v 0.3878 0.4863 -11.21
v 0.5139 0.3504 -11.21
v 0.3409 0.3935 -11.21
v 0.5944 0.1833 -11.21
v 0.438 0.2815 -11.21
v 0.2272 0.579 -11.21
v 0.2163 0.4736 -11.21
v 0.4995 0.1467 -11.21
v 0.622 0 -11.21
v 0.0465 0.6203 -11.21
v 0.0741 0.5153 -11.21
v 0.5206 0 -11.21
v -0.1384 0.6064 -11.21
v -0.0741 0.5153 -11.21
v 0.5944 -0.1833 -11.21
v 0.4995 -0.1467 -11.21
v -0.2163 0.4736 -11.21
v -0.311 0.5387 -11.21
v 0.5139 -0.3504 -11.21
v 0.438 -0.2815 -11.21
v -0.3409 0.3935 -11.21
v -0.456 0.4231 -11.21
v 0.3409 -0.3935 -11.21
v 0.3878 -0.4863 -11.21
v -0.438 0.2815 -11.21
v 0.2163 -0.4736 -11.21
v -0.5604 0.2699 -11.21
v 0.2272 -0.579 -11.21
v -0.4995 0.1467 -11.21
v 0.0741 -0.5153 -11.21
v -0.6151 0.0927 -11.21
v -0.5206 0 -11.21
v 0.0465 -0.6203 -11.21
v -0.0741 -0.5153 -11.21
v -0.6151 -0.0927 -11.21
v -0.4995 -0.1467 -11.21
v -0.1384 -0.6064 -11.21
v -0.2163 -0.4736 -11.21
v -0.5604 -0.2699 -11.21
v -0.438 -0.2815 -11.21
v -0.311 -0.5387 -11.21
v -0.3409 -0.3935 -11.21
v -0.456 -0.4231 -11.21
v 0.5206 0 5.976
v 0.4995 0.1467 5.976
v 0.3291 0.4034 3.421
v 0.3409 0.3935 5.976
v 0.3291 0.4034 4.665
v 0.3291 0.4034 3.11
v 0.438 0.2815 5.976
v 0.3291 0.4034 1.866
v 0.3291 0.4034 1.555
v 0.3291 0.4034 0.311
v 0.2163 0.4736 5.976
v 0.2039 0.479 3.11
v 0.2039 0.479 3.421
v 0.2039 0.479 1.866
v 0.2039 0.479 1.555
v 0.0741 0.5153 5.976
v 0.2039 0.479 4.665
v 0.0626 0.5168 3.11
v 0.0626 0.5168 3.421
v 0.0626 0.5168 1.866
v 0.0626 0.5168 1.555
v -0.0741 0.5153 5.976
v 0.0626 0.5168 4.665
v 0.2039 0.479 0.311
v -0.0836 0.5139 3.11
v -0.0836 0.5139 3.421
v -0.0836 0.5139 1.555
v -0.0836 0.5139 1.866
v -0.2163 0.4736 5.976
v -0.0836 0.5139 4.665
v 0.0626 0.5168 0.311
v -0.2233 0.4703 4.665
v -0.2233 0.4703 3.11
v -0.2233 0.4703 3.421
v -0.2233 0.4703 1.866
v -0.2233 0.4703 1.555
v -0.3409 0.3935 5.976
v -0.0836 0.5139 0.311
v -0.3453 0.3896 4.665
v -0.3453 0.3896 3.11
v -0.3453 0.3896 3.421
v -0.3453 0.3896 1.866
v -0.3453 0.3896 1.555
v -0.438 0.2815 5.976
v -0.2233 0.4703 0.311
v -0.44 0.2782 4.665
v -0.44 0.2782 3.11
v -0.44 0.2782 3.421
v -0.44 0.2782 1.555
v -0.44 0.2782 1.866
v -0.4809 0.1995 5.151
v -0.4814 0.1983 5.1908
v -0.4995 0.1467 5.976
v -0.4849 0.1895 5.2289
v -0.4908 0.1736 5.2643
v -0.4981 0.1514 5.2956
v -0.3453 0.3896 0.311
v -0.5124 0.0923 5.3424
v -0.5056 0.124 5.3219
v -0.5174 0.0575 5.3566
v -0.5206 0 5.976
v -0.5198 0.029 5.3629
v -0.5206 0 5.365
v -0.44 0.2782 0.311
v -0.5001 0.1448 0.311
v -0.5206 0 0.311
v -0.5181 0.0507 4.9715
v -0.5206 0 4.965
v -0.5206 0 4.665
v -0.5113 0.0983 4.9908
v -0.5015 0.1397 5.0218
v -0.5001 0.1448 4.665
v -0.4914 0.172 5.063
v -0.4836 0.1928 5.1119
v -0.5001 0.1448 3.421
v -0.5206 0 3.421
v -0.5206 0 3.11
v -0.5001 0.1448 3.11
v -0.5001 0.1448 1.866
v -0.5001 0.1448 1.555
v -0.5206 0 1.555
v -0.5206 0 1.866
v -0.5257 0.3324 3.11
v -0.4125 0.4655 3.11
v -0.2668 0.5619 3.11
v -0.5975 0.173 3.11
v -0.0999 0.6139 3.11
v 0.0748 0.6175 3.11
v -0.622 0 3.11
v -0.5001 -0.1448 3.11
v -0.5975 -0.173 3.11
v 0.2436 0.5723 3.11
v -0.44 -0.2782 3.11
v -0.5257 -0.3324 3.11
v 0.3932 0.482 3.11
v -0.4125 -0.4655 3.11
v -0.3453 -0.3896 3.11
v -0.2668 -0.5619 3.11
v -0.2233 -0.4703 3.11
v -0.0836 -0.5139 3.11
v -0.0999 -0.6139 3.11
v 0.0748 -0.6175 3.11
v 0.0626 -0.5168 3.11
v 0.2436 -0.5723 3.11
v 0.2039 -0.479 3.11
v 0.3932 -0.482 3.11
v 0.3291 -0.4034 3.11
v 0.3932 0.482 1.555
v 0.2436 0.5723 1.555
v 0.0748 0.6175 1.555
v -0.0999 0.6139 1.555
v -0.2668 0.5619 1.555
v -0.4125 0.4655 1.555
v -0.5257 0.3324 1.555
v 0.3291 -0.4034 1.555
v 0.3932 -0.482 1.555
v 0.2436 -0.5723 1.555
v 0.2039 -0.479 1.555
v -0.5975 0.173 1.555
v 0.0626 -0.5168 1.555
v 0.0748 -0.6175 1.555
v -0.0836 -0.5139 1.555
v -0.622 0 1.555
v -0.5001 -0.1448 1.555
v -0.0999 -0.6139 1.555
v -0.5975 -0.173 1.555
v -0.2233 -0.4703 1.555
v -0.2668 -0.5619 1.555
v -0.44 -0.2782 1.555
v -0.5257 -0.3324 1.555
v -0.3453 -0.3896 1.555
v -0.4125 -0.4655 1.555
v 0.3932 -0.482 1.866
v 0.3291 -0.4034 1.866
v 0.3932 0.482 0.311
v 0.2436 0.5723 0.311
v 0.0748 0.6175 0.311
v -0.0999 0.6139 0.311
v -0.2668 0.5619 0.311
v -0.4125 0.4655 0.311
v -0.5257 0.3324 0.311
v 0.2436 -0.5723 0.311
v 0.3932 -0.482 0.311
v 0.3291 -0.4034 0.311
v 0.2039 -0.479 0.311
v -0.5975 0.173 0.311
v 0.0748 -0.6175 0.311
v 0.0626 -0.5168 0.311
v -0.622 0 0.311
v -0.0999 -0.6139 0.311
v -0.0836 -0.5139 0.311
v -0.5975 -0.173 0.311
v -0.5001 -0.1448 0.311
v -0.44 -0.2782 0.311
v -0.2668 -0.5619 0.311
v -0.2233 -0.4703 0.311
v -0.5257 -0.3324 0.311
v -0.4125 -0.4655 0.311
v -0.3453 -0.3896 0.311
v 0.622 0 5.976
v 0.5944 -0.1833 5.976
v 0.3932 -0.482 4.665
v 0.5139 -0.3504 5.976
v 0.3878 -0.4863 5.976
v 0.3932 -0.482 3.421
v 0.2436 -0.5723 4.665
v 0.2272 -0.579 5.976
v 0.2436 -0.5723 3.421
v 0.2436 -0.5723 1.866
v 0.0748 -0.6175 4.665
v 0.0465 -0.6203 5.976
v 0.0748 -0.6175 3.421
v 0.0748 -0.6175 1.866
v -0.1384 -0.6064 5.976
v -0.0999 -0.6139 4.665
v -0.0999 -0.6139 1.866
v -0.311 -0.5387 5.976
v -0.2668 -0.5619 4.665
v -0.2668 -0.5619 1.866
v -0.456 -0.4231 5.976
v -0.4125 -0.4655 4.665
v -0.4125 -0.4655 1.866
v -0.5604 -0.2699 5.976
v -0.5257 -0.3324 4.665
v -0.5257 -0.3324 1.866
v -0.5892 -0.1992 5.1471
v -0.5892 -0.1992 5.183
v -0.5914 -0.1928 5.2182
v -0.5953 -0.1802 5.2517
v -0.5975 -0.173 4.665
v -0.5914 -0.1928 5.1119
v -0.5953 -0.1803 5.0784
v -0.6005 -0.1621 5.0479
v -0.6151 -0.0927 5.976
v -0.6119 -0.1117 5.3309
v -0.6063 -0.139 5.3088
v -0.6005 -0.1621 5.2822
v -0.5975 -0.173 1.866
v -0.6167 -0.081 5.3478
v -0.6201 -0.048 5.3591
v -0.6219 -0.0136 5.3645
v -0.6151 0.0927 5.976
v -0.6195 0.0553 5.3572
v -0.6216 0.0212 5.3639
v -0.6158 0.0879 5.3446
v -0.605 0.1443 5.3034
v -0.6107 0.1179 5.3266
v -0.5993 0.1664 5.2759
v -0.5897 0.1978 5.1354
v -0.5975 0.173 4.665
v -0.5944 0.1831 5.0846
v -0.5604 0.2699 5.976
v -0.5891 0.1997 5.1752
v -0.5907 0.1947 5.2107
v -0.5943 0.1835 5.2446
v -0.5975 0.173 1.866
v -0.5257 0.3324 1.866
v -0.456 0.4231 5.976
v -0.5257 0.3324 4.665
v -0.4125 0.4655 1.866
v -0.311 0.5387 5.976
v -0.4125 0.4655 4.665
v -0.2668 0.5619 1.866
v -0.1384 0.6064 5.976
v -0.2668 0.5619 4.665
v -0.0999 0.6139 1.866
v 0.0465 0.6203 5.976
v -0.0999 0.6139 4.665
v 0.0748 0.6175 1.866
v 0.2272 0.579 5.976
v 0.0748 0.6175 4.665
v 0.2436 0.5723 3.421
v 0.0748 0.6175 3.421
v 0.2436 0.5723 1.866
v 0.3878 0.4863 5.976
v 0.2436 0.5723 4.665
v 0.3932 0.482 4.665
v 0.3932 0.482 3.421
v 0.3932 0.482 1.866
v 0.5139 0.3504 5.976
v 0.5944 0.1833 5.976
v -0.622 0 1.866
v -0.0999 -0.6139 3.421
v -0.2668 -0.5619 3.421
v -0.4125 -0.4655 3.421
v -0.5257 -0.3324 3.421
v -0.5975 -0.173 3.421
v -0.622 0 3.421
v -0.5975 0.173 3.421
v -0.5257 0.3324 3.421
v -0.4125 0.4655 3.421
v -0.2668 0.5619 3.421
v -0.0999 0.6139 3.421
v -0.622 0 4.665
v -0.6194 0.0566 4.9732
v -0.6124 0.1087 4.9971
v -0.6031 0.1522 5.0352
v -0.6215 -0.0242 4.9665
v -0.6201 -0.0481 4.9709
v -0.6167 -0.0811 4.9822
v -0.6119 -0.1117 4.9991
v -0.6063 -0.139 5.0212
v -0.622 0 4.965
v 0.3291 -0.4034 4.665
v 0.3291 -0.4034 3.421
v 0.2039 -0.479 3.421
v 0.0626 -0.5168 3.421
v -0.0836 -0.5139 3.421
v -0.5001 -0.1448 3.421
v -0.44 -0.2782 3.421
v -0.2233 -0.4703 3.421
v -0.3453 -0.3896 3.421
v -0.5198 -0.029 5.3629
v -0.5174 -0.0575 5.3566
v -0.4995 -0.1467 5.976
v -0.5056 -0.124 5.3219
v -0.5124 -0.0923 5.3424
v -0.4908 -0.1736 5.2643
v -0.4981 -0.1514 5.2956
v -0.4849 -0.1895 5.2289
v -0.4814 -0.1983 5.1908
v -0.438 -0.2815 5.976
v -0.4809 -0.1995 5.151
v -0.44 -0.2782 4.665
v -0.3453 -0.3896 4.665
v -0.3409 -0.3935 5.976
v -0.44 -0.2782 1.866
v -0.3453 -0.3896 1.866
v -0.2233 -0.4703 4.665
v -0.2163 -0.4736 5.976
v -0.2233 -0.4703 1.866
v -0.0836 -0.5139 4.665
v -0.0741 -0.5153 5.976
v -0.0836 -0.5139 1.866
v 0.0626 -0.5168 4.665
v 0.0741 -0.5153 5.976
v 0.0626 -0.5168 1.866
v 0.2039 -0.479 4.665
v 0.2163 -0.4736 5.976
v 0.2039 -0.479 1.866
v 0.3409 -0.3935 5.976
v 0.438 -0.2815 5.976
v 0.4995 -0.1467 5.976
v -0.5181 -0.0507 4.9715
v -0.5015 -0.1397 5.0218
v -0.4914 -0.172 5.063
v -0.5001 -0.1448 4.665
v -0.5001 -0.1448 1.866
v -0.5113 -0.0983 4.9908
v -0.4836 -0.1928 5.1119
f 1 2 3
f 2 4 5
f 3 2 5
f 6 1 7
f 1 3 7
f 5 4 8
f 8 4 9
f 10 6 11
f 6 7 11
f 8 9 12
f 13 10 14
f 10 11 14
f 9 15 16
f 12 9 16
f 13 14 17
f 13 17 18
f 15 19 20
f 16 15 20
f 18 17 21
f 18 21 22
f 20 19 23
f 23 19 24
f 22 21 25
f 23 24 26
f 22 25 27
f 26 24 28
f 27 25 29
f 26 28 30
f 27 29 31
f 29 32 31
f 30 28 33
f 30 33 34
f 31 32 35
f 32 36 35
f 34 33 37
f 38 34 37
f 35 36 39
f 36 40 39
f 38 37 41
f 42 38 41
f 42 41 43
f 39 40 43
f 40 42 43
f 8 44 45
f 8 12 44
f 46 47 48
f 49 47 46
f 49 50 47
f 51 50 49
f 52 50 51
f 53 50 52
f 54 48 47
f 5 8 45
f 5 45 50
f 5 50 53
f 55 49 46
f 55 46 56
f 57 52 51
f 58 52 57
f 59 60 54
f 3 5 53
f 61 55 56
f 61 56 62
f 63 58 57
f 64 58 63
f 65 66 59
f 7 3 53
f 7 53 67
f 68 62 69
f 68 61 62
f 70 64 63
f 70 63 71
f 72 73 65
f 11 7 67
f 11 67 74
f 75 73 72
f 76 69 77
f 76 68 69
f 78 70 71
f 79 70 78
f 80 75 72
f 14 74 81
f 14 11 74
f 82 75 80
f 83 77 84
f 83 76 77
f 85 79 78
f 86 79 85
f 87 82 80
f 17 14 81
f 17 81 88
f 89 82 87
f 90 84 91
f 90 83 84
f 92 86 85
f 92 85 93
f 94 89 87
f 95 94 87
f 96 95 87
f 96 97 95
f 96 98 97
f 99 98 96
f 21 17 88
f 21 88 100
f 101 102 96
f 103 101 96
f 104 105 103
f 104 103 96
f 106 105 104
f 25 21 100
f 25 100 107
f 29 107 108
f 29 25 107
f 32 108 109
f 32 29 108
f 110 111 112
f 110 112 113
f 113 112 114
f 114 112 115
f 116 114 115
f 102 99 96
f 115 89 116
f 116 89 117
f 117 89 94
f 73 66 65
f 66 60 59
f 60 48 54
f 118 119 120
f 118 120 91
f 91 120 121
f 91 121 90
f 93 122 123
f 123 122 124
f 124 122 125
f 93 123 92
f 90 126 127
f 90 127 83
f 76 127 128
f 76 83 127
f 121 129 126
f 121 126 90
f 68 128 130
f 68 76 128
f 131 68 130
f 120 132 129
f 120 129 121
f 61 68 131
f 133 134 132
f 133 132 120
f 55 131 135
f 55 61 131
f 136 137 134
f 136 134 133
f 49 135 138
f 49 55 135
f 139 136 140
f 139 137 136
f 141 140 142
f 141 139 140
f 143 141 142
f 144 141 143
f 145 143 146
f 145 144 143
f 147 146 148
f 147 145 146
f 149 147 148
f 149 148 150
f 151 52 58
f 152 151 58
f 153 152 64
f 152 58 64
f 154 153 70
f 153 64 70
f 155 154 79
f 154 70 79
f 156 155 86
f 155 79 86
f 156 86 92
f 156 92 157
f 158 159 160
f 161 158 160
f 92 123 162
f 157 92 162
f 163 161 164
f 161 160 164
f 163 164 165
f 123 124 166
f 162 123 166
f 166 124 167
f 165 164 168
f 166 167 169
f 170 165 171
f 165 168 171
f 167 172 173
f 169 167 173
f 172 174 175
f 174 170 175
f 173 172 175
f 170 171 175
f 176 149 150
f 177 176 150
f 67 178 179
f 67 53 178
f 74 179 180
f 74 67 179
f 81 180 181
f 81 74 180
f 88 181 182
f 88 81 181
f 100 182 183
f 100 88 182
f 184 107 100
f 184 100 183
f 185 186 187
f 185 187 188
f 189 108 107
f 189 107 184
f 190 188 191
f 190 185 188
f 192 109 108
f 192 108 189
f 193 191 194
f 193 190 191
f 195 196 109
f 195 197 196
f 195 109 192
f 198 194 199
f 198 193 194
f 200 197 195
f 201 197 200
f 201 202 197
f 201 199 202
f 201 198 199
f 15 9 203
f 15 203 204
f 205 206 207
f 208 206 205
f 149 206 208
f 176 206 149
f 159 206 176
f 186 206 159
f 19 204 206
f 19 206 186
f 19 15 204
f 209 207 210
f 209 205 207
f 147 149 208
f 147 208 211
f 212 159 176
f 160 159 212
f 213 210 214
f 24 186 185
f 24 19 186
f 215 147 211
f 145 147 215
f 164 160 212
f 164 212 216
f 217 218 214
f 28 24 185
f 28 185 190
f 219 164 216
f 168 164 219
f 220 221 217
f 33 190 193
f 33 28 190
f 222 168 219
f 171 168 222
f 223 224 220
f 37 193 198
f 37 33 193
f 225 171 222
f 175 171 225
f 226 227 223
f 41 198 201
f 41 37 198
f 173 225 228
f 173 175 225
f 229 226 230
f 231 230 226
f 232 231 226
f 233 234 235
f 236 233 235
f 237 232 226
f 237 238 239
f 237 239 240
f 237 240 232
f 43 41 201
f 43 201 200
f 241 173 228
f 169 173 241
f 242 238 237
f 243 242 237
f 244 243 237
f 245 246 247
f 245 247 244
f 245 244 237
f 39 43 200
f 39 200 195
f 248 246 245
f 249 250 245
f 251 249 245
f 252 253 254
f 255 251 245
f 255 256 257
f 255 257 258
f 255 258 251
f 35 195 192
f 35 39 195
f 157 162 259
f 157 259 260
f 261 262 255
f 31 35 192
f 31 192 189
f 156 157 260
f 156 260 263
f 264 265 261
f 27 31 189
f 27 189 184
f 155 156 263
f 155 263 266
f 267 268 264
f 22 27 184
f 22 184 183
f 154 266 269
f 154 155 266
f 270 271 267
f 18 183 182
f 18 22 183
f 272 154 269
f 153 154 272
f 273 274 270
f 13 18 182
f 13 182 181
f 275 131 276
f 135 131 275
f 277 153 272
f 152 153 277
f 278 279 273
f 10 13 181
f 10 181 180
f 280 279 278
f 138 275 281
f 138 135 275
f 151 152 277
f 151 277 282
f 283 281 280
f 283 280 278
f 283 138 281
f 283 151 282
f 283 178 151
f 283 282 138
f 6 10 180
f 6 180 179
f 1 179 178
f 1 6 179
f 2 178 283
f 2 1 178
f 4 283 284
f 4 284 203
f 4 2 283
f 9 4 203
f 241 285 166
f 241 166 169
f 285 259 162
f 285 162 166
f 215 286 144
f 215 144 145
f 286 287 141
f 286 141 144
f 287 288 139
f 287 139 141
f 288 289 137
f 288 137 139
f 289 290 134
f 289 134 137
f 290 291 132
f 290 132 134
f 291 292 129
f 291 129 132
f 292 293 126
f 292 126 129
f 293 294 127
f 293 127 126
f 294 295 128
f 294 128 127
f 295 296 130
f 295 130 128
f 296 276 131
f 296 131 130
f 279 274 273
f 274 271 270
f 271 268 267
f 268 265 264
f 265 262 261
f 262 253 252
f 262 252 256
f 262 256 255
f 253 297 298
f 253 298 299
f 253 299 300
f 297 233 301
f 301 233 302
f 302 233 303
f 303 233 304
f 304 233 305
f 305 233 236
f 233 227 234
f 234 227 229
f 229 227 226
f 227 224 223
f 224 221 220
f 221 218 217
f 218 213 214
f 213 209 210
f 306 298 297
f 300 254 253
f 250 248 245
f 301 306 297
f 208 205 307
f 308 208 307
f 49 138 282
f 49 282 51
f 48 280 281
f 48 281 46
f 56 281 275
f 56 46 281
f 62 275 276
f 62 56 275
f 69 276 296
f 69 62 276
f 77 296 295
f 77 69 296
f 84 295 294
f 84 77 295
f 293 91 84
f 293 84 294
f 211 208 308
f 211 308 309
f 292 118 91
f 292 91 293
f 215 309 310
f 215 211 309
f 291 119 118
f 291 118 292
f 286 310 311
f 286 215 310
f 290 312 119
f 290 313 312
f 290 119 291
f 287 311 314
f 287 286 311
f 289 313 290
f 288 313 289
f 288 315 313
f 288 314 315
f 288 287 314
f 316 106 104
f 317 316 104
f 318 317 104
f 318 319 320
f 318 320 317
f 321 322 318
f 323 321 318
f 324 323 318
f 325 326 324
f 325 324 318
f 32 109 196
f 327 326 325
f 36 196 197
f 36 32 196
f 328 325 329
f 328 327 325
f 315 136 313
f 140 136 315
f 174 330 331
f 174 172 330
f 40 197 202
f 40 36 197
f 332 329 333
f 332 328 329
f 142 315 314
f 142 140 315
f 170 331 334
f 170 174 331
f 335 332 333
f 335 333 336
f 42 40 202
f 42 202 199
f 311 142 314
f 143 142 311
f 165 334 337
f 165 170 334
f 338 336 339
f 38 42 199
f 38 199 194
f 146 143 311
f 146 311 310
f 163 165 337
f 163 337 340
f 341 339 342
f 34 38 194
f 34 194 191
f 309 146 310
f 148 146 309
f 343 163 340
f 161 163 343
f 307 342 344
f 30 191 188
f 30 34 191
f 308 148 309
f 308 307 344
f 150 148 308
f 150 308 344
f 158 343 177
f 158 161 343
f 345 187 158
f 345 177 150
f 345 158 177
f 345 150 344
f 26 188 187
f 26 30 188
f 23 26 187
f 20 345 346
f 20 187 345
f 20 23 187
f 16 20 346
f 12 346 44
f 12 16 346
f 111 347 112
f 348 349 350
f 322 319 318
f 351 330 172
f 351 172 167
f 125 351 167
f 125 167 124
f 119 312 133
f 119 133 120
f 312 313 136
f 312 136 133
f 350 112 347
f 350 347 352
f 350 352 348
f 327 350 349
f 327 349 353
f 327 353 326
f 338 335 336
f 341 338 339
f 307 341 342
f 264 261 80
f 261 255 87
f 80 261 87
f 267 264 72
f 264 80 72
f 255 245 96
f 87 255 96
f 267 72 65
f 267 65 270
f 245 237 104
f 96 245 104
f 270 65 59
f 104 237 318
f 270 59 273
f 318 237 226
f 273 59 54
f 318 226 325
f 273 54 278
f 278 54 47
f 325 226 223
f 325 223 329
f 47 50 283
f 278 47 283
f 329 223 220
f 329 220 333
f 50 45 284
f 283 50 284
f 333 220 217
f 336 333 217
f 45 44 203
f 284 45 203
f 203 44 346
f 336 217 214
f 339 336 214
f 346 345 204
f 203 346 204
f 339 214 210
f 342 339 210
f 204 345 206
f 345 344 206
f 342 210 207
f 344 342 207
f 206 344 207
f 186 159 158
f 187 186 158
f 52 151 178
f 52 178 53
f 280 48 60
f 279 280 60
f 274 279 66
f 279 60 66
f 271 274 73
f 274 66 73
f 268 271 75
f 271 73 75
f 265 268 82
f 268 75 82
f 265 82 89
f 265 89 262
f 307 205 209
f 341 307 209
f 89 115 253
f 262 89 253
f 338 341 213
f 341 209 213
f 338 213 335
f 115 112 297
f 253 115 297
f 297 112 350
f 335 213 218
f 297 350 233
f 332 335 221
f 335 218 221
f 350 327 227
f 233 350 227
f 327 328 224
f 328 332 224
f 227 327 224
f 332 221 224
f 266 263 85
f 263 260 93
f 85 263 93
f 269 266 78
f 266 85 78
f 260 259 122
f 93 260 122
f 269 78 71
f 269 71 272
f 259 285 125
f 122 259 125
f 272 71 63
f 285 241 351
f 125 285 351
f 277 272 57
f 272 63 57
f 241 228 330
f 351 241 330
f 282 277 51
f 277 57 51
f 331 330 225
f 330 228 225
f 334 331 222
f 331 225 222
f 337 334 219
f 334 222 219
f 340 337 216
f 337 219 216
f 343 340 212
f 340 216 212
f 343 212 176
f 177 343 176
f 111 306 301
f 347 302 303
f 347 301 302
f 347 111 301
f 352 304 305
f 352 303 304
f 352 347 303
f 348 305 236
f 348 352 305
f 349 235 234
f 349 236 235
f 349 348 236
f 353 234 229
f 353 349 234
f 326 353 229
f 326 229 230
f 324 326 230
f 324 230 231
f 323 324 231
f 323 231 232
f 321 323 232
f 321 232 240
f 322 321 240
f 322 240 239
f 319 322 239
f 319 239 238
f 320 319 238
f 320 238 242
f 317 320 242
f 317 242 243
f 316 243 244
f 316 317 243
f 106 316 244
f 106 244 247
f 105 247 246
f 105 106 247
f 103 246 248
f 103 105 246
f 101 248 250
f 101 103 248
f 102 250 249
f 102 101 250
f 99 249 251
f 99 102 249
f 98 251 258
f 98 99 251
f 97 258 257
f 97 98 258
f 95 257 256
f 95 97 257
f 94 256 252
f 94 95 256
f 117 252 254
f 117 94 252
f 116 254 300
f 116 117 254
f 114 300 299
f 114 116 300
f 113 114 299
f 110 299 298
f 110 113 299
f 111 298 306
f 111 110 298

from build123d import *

# Parameters (mm, degrees)
SURFACE_EXTRUDE1_1_DEPTH   = 1.866
SURFACE_TRIM1_TOOL_2_BACK  = 3.327
SURFACE_TRIM1_TOOL_2_DEPTH = 6.654
THICKEN2_T1                = 0.101386
LPATTERN3_COUNT            = 3
LPATTERN3_PITCH            = 1.555
BOSS_EXTRUDE1_DEPTH        = 11.21
BOSS_EXTRUDE2_DEPTH        = 1
SKETCH7_R                  = 0.2
CUT_EXTRUDE2_DEPTH         = 12.244459436


with BuildPart() as body_1:
    # Surface-Extrude1: a surface, the sketch's curves swept straight by 1.866 mm
    with BuildLine(Plane.XY, mode=Mode.PRIVATE) as surface_extrude1_1_path:
        ThreePointArc((0.622, 0), (0, 0.622), (-0.622, 0))
    surface_extrude1_1 = Shell.extrude(surface_extrude1_1_path.wire(), (0 * SURFACE_EXTRUDE1_1_DEPTH, 0 * SURFACE_EXTRUDE1_1_DEPTH, 1 * SURFACE_EXTRUDE1_1_DEPTH))
    # Surface-Trim1 tool: a surface, the sketch's curves swept straight by 6.654 mm
    with BuildLine(Plane(origin=(0, 0, 0), x_dir=(1, 0, 0), z_dir=(0, 1, 0)).offset(-SURFACE_TRIM1_TOOL_2_BACK), mode=Mode.PRIVATE) as surface_trim1_tool_2_path:
        Line((-0.622, -1.555), (0.3932, -1.555))
        Line((0.3932, -1.555), (0.3932, -0.311))
        Line((0.3932, -0.311), (-0.622, -0.311))
    surface_trim1_tool_2 = Shell.extrude(surface_trim1_tool_2_path.wire(), (0 * SURFACE_TRIM1_TOOL_2_DEPTH, 1 * SURFACE_TRIM1_TOOL_2_DEPTH, 0 * SURFACE_TRIM1_TOOL_2_DEPTH))
    # Surface-Trim1: the surface trimmed, the side behind the tool kept
    surface_trim1_3 = split(surface_extrude1_1.faces()[0], bisect_by=surface_trim1_tool_2, keep=Keep.BOTTOM).faces()[0]
    add(Solid.thicken(surface_trim1_3, THICKEN2_T1))


with BuildPart() as lpattern3_1:
    # LPattern3: pattern copy
    add(body_1.part.moved(Location(Vector(0, 0, 1) * (1 * LPATTERN3_PITCH))))


with BuildPart() as lpattern3_2:
    # LPattern3: pattern copy
    add(body_1.part.moved(Location(Vector(0, 0, 1) * (2 * LPATTERN3_PITCH))))


with BuildPart() as body_1_1:
    add(body_1.part)

    # Combine1: read off the stored shape, not the designer's step
    # Combine1: union LPattern3_2, LPattern3_1
    add(lpattern3_2.part)
    add(lpattern3_1.part)

    # Sketch5 → Boss-Extrude1 (add)
    with BuildSketch(Plane(origin=(0, 0, 0), x_dir=(-1, 0, 0), z_dir=(0, 0, -1))):
        with BuildLine():
            Line((-0.622, 0), (-0.520614, 0))
            ThreePointArc((-0.520614, 0), (0, 0.520614), (0.520614, 0))
            Line((0.520614, 0), (0.622, 0))
            ThreePointArc((0.622, 0), (0, 0.622), (-0.622, 0))
        make_face()
    extrude(amount=BOSS_EXTRUDE1_DEPTH)

    # Sketch6 → Boss-Extrude2 (add)
    with BuildSketch(Plane.XY.offset(4.976)):
        with BuildLine():
            Line((-0.622, 0), (-0.520614, 0))
            ThreePointArc((-0.520614, 0), (0, 0.520614), (0.520614, 0))
            Line((0.520614, 0), (0.622, 0))
            ThreePointArc((0.622, 0), (0, 0.622), (-0.622, 0))
        make_face()
    extrude(amount=BOSS_EXTRUDE2_DEPTH)

    # Sketch7 → Cut-Extrude2 (cut, through all)
    with BuildSketch(Plane(origin=(0, 0, 0), x_dir=(0, 0, -1), z_dir=(1, 0, 0))):
        with Locations((-5.165, 0)):
            Circle(SKETCH7_R)
    extrude(amount=-CUT_EXTRUDE2_DEPTH, mode=Mode.SUBTRACT)

    # Mirror1: body 1 across face


with BuildPart() as body_1_2:
    add(body_1_1.part)
    add(body_1_1.part.mirror(Plane(origin=(0.571307, 0, -2.617), x_dir=(0, 0, 1), z_dir=(0, -1, 0))))


solid = body_1_2.part
